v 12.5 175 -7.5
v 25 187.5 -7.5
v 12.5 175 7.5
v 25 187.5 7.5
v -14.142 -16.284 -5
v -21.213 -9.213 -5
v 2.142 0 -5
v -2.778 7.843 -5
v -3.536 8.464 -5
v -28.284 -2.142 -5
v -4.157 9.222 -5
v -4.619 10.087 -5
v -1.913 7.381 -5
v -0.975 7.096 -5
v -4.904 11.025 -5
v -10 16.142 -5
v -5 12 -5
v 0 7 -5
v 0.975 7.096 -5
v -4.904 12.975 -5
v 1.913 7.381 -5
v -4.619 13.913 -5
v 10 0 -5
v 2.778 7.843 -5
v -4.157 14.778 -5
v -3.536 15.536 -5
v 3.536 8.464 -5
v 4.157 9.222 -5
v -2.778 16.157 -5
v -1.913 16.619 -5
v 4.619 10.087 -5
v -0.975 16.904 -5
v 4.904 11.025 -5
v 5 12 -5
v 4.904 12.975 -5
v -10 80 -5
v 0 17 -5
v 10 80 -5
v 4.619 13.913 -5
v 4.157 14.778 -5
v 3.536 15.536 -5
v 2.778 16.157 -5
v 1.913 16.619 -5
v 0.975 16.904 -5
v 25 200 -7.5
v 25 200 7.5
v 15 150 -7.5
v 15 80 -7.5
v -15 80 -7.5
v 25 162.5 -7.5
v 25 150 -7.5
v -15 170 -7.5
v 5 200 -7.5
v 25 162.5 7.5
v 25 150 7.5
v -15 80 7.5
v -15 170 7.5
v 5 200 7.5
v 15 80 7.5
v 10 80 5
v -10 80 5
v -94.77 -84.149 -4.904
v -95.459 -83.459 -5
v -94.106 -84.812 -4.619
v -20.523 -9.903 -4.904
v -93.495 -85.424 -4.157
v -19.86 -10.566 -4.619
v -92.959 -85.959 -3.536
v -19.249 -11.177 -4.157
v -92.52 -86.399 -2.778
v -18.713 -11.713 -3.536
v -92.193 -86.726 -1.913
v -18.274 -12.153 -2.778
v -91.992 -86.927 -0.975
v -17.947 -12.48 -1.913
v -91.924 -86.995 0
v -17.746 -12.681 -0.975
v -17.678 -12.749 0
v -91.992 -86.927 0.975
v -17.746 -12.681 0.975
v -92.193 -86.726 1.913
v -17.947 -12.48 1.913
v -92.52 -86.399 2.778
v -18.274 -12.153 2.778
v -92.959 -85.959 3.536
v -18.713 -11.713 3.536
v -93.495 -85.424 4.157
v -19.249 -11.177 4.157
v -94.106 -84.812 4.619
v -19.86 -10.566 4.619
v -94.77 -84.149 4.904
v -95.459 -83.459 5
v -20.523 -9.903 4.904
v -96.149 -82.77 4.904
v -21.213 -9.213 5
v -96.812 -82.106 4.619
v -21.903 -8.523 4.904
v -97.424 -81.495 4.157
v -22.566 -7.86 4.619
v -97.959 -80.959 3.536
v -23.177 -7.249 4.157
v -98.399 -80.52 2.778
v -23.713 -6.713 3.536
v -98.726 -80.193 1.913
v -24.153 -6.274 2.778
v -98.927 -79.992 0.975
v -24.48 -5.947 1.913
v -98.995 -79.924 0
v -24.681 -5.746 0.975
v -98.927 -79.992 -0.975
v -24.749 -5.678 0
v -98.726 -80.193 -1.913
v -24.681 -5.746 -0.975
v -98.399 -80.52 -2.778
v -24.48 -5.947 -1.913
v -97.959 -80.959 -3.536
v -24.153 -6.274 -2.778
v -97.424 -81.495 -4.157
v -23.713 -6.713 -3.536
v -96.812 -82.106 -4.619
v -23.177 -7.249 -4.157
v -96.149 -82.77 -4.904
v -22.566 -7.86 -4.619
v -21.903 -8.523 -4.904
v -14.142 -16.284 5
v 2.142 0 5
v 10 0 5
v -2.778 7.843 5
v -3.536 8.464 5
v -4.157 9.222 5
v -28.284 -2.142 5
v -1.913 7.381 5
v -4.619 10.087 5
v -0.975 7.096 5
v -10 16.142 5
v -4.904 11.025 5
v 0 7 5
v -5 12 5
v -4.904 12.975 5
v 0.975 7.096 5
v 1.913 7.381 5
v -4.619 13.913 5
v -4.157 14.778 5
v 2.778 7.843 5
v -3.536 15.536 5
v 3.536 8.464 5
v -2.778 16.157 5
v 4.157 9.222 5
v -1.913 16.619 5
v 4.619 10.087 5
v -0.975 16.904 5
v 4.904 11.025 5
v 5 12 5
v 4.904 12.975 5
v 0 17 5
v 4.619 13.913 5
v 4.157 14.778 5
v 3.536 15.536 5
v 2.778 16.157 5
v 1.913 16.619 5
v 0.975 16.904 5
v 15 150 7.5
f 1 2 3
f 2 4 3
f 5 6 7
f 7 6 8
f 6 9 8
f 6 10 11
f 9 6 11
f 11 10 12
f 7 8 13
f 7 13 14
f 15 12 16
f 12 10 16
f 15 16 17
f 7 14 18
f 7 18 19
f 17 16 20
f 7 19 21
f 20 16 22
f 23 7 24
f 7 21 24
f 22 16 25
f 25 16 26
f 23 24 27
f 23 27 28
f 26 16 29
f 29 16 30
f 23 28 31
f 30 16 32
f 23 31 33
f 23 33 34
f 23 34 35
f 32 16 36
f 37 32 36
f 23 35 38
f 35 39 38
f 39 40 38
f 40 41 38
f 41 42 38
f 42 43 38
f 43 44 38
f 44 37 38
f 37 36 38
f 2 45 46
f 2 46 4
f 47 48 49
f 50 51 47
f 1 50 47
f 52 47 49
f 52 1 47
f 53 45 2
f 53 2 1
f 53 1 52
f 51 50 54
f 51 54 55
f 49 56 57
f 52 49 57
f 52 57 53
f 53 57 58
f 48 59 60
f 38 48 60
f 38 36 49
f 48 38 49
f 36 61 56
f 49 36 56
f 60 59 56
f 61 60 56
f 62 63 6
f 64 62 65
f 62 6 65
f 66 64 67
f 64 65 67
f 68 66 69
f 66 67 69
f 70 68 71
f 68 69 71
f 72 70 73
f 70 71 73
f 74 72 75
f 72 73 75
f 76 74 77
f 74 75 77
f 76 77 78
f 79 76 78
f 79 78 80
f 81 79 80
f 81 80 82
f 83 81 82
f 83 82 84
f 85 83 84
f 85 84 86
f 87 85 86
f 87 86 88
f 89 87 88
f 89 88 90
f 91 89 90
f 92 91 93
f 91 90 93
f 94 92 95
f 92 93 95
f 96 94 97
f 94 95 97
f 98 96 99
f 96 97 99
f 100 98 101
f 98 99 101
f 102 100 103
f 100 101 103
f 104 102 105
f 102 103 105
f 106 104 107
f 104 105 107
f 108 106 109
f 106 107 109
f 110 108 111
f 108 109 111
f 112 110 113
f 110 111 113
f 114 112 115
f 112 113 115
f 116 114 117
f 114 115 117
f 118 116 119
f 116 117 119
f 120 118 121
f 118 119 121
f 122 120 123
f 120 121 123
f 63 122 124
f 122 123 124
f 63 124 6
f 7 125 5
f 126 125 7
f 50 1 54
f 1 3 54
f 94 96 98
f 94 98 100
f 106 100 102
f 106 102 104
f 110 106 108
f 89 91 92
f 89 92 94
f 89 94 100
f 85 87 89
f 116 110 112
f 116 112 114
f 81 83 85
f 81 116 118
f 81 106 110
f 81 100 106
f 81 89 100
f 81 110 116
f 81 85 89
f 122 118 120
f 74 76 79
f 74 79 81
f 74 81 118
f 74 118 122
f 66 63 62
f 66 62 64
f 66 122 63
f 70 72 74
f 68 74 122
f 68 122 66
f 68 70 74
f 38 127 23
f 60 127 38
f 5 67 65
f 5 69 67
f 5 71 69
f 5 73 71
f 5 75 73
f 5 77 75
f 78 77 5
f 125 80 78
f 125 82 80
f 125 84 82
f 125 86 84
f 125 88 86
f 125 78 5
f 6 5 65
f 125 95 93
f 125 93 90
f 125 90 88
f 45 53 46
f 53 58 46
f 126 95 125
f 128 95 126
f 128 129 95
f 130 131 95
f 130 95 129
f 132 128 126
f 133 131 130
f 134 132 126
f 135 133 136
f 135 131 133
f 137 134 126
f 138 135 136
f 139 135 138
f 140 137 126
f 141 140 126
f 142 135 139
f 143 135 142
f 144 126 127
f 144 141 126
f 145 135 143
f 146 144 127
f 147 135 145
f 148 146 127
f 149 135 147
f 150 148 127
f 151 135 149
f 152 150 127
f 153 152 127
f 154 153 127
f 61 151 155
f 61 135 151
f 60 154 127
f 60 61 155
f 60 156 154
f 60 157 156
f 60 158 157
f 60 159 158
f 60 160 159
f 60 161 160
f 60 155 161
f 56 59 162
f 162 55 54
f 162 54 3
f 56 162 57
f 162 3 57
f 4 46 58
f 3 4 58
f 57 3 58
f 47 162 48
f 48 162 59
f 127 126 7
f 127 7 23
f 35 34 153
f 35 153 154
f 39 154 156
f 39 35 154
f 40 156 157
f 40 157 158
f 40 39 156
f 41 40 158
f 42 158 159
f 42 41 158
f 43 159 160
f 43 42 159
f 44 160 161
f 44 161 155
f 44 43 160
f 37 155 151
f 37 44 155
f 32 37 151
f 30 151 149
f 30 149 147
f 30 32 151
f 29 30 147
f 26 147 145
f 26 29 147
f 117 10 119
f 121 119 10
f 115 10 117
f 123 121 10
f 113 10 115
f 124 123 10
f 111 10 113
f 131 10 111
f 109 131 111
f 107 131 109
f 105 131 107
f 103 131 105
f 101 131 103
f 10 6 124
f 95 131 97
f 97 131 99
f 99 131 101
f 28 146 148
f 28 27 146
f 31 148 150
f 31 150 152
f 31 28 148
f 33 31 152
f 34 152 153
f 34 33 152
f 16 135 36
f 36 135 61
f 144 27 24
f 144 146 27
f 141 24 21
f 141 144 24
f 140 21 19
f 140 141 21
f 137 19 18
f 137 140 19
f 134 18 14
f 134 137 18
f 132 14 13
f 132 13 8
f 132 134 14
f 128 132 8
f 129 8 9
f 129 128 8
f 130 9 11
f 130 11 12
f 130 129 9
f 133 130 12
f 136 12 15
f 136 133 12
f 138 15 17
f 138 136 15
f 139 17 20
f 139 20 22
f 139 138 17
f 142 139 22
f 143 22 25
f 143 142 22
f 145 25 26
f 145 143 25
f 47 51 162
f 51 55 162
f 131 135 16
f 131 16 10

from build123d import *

# Parameters (mm, degrees)
SKETCH1_W           = 20
SKETCH1_H           = 80
SKETCH1_R           = 5
BOSS_EXTRUDE1_DEPTH = 5
BOSS_EXTRUDE2_DEPTH = 7.5
BOSS_EXTRUDE3_DEPTH = 5
SKETCH4_R           = 5
BOSS_EXTRUDE4_DEPTH = 105


with BuildPart() as part:
    # Sketch1 → Boss-Extrude1 (new, symmetric)
    with BuildSketch(Plane.XY):
        with Locations((0, 40)):
            Rectangle(SKETCH1_W, SKETCH1_H)
        with Locations((0, 12)):
            Circle(SKETCH1_R, mode=Mode.SUBTRACT)
    extrude(amount=BOSS_EXTRUDE1_DEPTH, both=True)

    # Sketch2 → Boss-Extrude2 (add, symmetric)
    with BuildSketch(Plane.XY):
        Polygon((-15, 80), (-15, 170), (5, 200), (25, 200), (25, 187.5), (12.5, 175), (25, 162.5), (25, 150), (15, 150), (15, 80), align=None)
    extrude(amount=BOSS_EXTRUDE2_DEPTH, both=True)

    # Sketch3 → Boss-Extrude3 (add, symmetric)
    with BuildSketch(Plane.XY):
        with BuildLine():
            Line((-7.071067812, 19.071067812), (-28.284271247, -2.142135624))
            Line((-28.284271247, -2.142135624), (-14.142135624, -16.284271247))
            Line((-14.142135624, -16.284271247), (7.071067812, 4.928932188))
            Line((7.071067812, 4.928932188), (3.535533906, 8.464466094))
            ThreePointArc((3.535533906, 8.464466094), (-3.535533906, 8.464466094), (-3.535533906, 15.535533906))
            Line((-3.535533906, 15.535533906), (-7.071067812, 19.071067812))
        make_face()
    extrude(amount=BOSS_EXTRUDE3_DEPTH, both=True)

    # Sketch4 → Boss-Extrude4 (add)
    with BuildSketch(Plane(origin=(-15.213203436, -15.213203436, 0), x_dir=(0, 0, 1), z_dir=(-0.7071067811865512, -0.7071067811865438, 0))):
        with Locations(Location((0, 8.485281374, 0), (0, 0, 180))):
            Circle(SKETCH4_R)
    extrude(amount=BOSS_EXTRUDE4_DEPTH)


solid = part.part
